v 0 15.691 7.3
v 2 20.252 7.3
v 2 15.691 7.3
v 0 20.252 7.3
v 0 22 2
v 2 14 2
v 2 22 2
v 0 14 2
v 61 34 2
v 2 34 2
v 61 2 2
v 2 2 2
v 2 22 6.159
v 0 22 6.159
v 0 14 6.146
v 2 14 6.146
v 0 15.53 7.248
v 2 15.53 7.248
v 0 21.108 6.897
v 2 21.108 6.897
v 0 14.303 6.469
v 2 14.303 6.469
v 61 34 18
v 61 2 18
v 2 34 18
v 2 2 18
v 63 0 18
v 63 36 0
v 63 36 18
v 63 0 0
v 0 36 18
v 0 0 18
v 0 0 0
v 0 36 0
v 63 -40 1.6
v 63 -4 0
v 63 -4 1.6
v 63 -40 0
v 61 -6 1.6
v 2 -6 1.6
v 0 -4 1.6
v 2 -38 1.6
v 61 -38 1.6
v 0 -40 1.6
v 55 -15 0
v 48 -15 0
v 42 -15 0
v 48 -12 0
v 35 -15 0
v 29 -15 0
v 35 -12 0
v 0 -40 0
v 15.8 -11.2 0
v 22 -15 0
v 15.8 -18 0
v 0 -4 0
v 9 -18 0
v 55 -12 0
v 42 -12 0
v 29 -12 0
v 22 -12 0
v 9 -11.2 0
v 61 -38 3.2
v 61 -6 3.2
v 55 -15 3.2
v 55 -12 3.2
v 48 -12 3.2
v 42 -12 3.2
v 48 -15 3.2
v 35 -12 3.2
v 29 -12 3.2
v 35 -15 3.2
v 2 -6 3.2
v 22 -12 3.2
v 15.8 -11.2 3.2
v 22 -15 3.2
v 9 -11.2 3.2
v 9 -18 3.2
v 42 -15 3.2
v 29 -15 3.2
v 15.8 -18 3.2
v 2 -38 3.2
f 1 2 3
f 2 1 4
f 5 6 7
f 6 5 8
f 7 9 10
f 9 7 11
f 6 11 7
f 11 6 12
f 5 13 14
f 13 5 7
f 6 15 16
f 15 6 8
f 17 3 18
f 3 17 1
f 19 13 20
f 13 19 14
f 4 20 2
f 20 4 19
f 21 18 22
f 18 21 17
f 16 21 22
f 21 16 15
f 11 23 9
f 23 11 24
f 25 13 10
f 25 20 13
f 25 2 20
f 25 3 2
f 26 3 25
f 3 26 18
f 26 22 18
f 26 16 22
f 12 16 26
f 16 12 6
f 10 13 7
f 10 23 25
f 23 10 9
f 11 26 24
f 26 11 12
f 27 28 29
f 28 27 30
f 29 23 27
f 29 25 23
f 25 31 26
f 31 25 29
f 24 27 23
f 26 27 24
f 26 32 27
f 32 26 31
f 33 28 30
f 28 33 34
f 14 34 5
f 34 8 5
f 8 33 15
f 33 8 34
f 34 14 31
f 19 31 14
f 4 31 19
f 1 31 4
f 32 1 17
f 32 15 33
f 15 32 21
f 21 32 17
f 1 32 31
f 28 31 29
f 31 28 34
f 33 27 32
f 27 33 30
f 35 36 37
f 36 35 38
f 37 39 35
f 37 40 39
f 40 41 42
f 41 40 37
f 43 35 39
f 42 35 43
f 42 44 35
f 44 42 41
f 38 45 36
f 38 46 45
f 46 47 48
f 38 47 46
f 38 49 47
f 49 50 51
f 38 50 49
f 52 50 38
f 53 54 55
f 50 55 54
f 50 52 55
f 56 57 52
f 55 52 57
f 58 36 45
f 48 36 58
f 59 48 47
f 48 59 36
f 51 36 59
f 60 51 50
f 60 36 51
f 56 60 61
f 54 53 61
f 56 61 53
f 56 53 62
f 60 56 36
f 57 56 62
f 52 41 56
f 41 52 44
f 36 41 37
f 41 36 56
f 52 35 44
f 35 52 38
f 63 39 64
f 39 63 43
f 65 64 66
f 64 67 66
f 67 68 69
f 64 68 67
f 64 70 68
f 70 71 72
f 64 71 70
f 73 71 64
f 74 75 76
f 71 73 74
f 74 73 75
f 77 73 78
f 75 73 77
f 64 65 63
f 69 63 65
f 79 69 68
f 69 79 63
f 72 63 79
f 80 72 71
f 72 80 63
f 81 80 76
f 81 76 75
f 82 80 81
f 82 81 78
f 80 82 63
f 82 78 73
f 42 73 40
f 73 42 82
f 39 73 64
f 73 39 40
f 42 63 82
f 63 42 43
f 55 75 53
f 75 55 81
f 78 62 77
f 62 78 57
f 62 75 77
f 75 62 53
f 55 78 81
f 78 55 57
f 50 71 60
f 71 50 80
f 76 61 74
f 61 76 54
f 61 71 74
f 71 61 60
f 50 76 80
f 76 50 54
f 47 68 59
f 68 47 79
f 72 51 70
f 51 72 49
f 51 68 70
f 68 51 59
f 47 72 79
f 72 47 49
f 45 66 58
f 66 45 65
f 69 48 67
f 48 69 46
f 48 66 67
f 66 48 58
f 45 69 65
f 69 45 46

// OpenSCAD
wall = 2;
length = 59;
width = 32;
height = 14;
usb_hole = 8;
$fn=25;
top_scaling = 0.8;

difference() {
    cube([length + 2*wall, width + 2*wall, height + 2 * wall]);
    union() {        
        translate([wall, wall, wall]) {
            cube([length, width, height+100]);
        }
        translate([-1, wall + width/2 - usb_hole / 2, wall]) {
            intersection() {
                cube([10, usb_hole, 5.3]);
                translate([0,usb_hole/2,0]) {
                    rotate([90, 0, 90]) {
                        cylinder(10, 5.8, 5.8, center=true);
                    }
                }
            }
        }
    }
}

translate([0,-40,0]) {
    difference() {
        union() {
            cube([length + wall*2, width + wall*2, wall*top_scaling]);
            translate([wall,wall,wall*top_scaling]) {
                cube([length, width, wall*top_scaling]);
            }
        }
        union() {
            // button
            translate([9,width-wall*5,-1]) {
                cube([6.8,6.8,100]);
            }
            // stiftlist
            translate([22,width-wall-5,-1]) {
                cube([7,3,100]);
            }
            translate([35,width-wall-5,-1]) {
                cube([7,3,100]);
            }
            translate([48,width-wall-5,-1]) {
                cube([7,3,100]);
            }
        }
    }
}
